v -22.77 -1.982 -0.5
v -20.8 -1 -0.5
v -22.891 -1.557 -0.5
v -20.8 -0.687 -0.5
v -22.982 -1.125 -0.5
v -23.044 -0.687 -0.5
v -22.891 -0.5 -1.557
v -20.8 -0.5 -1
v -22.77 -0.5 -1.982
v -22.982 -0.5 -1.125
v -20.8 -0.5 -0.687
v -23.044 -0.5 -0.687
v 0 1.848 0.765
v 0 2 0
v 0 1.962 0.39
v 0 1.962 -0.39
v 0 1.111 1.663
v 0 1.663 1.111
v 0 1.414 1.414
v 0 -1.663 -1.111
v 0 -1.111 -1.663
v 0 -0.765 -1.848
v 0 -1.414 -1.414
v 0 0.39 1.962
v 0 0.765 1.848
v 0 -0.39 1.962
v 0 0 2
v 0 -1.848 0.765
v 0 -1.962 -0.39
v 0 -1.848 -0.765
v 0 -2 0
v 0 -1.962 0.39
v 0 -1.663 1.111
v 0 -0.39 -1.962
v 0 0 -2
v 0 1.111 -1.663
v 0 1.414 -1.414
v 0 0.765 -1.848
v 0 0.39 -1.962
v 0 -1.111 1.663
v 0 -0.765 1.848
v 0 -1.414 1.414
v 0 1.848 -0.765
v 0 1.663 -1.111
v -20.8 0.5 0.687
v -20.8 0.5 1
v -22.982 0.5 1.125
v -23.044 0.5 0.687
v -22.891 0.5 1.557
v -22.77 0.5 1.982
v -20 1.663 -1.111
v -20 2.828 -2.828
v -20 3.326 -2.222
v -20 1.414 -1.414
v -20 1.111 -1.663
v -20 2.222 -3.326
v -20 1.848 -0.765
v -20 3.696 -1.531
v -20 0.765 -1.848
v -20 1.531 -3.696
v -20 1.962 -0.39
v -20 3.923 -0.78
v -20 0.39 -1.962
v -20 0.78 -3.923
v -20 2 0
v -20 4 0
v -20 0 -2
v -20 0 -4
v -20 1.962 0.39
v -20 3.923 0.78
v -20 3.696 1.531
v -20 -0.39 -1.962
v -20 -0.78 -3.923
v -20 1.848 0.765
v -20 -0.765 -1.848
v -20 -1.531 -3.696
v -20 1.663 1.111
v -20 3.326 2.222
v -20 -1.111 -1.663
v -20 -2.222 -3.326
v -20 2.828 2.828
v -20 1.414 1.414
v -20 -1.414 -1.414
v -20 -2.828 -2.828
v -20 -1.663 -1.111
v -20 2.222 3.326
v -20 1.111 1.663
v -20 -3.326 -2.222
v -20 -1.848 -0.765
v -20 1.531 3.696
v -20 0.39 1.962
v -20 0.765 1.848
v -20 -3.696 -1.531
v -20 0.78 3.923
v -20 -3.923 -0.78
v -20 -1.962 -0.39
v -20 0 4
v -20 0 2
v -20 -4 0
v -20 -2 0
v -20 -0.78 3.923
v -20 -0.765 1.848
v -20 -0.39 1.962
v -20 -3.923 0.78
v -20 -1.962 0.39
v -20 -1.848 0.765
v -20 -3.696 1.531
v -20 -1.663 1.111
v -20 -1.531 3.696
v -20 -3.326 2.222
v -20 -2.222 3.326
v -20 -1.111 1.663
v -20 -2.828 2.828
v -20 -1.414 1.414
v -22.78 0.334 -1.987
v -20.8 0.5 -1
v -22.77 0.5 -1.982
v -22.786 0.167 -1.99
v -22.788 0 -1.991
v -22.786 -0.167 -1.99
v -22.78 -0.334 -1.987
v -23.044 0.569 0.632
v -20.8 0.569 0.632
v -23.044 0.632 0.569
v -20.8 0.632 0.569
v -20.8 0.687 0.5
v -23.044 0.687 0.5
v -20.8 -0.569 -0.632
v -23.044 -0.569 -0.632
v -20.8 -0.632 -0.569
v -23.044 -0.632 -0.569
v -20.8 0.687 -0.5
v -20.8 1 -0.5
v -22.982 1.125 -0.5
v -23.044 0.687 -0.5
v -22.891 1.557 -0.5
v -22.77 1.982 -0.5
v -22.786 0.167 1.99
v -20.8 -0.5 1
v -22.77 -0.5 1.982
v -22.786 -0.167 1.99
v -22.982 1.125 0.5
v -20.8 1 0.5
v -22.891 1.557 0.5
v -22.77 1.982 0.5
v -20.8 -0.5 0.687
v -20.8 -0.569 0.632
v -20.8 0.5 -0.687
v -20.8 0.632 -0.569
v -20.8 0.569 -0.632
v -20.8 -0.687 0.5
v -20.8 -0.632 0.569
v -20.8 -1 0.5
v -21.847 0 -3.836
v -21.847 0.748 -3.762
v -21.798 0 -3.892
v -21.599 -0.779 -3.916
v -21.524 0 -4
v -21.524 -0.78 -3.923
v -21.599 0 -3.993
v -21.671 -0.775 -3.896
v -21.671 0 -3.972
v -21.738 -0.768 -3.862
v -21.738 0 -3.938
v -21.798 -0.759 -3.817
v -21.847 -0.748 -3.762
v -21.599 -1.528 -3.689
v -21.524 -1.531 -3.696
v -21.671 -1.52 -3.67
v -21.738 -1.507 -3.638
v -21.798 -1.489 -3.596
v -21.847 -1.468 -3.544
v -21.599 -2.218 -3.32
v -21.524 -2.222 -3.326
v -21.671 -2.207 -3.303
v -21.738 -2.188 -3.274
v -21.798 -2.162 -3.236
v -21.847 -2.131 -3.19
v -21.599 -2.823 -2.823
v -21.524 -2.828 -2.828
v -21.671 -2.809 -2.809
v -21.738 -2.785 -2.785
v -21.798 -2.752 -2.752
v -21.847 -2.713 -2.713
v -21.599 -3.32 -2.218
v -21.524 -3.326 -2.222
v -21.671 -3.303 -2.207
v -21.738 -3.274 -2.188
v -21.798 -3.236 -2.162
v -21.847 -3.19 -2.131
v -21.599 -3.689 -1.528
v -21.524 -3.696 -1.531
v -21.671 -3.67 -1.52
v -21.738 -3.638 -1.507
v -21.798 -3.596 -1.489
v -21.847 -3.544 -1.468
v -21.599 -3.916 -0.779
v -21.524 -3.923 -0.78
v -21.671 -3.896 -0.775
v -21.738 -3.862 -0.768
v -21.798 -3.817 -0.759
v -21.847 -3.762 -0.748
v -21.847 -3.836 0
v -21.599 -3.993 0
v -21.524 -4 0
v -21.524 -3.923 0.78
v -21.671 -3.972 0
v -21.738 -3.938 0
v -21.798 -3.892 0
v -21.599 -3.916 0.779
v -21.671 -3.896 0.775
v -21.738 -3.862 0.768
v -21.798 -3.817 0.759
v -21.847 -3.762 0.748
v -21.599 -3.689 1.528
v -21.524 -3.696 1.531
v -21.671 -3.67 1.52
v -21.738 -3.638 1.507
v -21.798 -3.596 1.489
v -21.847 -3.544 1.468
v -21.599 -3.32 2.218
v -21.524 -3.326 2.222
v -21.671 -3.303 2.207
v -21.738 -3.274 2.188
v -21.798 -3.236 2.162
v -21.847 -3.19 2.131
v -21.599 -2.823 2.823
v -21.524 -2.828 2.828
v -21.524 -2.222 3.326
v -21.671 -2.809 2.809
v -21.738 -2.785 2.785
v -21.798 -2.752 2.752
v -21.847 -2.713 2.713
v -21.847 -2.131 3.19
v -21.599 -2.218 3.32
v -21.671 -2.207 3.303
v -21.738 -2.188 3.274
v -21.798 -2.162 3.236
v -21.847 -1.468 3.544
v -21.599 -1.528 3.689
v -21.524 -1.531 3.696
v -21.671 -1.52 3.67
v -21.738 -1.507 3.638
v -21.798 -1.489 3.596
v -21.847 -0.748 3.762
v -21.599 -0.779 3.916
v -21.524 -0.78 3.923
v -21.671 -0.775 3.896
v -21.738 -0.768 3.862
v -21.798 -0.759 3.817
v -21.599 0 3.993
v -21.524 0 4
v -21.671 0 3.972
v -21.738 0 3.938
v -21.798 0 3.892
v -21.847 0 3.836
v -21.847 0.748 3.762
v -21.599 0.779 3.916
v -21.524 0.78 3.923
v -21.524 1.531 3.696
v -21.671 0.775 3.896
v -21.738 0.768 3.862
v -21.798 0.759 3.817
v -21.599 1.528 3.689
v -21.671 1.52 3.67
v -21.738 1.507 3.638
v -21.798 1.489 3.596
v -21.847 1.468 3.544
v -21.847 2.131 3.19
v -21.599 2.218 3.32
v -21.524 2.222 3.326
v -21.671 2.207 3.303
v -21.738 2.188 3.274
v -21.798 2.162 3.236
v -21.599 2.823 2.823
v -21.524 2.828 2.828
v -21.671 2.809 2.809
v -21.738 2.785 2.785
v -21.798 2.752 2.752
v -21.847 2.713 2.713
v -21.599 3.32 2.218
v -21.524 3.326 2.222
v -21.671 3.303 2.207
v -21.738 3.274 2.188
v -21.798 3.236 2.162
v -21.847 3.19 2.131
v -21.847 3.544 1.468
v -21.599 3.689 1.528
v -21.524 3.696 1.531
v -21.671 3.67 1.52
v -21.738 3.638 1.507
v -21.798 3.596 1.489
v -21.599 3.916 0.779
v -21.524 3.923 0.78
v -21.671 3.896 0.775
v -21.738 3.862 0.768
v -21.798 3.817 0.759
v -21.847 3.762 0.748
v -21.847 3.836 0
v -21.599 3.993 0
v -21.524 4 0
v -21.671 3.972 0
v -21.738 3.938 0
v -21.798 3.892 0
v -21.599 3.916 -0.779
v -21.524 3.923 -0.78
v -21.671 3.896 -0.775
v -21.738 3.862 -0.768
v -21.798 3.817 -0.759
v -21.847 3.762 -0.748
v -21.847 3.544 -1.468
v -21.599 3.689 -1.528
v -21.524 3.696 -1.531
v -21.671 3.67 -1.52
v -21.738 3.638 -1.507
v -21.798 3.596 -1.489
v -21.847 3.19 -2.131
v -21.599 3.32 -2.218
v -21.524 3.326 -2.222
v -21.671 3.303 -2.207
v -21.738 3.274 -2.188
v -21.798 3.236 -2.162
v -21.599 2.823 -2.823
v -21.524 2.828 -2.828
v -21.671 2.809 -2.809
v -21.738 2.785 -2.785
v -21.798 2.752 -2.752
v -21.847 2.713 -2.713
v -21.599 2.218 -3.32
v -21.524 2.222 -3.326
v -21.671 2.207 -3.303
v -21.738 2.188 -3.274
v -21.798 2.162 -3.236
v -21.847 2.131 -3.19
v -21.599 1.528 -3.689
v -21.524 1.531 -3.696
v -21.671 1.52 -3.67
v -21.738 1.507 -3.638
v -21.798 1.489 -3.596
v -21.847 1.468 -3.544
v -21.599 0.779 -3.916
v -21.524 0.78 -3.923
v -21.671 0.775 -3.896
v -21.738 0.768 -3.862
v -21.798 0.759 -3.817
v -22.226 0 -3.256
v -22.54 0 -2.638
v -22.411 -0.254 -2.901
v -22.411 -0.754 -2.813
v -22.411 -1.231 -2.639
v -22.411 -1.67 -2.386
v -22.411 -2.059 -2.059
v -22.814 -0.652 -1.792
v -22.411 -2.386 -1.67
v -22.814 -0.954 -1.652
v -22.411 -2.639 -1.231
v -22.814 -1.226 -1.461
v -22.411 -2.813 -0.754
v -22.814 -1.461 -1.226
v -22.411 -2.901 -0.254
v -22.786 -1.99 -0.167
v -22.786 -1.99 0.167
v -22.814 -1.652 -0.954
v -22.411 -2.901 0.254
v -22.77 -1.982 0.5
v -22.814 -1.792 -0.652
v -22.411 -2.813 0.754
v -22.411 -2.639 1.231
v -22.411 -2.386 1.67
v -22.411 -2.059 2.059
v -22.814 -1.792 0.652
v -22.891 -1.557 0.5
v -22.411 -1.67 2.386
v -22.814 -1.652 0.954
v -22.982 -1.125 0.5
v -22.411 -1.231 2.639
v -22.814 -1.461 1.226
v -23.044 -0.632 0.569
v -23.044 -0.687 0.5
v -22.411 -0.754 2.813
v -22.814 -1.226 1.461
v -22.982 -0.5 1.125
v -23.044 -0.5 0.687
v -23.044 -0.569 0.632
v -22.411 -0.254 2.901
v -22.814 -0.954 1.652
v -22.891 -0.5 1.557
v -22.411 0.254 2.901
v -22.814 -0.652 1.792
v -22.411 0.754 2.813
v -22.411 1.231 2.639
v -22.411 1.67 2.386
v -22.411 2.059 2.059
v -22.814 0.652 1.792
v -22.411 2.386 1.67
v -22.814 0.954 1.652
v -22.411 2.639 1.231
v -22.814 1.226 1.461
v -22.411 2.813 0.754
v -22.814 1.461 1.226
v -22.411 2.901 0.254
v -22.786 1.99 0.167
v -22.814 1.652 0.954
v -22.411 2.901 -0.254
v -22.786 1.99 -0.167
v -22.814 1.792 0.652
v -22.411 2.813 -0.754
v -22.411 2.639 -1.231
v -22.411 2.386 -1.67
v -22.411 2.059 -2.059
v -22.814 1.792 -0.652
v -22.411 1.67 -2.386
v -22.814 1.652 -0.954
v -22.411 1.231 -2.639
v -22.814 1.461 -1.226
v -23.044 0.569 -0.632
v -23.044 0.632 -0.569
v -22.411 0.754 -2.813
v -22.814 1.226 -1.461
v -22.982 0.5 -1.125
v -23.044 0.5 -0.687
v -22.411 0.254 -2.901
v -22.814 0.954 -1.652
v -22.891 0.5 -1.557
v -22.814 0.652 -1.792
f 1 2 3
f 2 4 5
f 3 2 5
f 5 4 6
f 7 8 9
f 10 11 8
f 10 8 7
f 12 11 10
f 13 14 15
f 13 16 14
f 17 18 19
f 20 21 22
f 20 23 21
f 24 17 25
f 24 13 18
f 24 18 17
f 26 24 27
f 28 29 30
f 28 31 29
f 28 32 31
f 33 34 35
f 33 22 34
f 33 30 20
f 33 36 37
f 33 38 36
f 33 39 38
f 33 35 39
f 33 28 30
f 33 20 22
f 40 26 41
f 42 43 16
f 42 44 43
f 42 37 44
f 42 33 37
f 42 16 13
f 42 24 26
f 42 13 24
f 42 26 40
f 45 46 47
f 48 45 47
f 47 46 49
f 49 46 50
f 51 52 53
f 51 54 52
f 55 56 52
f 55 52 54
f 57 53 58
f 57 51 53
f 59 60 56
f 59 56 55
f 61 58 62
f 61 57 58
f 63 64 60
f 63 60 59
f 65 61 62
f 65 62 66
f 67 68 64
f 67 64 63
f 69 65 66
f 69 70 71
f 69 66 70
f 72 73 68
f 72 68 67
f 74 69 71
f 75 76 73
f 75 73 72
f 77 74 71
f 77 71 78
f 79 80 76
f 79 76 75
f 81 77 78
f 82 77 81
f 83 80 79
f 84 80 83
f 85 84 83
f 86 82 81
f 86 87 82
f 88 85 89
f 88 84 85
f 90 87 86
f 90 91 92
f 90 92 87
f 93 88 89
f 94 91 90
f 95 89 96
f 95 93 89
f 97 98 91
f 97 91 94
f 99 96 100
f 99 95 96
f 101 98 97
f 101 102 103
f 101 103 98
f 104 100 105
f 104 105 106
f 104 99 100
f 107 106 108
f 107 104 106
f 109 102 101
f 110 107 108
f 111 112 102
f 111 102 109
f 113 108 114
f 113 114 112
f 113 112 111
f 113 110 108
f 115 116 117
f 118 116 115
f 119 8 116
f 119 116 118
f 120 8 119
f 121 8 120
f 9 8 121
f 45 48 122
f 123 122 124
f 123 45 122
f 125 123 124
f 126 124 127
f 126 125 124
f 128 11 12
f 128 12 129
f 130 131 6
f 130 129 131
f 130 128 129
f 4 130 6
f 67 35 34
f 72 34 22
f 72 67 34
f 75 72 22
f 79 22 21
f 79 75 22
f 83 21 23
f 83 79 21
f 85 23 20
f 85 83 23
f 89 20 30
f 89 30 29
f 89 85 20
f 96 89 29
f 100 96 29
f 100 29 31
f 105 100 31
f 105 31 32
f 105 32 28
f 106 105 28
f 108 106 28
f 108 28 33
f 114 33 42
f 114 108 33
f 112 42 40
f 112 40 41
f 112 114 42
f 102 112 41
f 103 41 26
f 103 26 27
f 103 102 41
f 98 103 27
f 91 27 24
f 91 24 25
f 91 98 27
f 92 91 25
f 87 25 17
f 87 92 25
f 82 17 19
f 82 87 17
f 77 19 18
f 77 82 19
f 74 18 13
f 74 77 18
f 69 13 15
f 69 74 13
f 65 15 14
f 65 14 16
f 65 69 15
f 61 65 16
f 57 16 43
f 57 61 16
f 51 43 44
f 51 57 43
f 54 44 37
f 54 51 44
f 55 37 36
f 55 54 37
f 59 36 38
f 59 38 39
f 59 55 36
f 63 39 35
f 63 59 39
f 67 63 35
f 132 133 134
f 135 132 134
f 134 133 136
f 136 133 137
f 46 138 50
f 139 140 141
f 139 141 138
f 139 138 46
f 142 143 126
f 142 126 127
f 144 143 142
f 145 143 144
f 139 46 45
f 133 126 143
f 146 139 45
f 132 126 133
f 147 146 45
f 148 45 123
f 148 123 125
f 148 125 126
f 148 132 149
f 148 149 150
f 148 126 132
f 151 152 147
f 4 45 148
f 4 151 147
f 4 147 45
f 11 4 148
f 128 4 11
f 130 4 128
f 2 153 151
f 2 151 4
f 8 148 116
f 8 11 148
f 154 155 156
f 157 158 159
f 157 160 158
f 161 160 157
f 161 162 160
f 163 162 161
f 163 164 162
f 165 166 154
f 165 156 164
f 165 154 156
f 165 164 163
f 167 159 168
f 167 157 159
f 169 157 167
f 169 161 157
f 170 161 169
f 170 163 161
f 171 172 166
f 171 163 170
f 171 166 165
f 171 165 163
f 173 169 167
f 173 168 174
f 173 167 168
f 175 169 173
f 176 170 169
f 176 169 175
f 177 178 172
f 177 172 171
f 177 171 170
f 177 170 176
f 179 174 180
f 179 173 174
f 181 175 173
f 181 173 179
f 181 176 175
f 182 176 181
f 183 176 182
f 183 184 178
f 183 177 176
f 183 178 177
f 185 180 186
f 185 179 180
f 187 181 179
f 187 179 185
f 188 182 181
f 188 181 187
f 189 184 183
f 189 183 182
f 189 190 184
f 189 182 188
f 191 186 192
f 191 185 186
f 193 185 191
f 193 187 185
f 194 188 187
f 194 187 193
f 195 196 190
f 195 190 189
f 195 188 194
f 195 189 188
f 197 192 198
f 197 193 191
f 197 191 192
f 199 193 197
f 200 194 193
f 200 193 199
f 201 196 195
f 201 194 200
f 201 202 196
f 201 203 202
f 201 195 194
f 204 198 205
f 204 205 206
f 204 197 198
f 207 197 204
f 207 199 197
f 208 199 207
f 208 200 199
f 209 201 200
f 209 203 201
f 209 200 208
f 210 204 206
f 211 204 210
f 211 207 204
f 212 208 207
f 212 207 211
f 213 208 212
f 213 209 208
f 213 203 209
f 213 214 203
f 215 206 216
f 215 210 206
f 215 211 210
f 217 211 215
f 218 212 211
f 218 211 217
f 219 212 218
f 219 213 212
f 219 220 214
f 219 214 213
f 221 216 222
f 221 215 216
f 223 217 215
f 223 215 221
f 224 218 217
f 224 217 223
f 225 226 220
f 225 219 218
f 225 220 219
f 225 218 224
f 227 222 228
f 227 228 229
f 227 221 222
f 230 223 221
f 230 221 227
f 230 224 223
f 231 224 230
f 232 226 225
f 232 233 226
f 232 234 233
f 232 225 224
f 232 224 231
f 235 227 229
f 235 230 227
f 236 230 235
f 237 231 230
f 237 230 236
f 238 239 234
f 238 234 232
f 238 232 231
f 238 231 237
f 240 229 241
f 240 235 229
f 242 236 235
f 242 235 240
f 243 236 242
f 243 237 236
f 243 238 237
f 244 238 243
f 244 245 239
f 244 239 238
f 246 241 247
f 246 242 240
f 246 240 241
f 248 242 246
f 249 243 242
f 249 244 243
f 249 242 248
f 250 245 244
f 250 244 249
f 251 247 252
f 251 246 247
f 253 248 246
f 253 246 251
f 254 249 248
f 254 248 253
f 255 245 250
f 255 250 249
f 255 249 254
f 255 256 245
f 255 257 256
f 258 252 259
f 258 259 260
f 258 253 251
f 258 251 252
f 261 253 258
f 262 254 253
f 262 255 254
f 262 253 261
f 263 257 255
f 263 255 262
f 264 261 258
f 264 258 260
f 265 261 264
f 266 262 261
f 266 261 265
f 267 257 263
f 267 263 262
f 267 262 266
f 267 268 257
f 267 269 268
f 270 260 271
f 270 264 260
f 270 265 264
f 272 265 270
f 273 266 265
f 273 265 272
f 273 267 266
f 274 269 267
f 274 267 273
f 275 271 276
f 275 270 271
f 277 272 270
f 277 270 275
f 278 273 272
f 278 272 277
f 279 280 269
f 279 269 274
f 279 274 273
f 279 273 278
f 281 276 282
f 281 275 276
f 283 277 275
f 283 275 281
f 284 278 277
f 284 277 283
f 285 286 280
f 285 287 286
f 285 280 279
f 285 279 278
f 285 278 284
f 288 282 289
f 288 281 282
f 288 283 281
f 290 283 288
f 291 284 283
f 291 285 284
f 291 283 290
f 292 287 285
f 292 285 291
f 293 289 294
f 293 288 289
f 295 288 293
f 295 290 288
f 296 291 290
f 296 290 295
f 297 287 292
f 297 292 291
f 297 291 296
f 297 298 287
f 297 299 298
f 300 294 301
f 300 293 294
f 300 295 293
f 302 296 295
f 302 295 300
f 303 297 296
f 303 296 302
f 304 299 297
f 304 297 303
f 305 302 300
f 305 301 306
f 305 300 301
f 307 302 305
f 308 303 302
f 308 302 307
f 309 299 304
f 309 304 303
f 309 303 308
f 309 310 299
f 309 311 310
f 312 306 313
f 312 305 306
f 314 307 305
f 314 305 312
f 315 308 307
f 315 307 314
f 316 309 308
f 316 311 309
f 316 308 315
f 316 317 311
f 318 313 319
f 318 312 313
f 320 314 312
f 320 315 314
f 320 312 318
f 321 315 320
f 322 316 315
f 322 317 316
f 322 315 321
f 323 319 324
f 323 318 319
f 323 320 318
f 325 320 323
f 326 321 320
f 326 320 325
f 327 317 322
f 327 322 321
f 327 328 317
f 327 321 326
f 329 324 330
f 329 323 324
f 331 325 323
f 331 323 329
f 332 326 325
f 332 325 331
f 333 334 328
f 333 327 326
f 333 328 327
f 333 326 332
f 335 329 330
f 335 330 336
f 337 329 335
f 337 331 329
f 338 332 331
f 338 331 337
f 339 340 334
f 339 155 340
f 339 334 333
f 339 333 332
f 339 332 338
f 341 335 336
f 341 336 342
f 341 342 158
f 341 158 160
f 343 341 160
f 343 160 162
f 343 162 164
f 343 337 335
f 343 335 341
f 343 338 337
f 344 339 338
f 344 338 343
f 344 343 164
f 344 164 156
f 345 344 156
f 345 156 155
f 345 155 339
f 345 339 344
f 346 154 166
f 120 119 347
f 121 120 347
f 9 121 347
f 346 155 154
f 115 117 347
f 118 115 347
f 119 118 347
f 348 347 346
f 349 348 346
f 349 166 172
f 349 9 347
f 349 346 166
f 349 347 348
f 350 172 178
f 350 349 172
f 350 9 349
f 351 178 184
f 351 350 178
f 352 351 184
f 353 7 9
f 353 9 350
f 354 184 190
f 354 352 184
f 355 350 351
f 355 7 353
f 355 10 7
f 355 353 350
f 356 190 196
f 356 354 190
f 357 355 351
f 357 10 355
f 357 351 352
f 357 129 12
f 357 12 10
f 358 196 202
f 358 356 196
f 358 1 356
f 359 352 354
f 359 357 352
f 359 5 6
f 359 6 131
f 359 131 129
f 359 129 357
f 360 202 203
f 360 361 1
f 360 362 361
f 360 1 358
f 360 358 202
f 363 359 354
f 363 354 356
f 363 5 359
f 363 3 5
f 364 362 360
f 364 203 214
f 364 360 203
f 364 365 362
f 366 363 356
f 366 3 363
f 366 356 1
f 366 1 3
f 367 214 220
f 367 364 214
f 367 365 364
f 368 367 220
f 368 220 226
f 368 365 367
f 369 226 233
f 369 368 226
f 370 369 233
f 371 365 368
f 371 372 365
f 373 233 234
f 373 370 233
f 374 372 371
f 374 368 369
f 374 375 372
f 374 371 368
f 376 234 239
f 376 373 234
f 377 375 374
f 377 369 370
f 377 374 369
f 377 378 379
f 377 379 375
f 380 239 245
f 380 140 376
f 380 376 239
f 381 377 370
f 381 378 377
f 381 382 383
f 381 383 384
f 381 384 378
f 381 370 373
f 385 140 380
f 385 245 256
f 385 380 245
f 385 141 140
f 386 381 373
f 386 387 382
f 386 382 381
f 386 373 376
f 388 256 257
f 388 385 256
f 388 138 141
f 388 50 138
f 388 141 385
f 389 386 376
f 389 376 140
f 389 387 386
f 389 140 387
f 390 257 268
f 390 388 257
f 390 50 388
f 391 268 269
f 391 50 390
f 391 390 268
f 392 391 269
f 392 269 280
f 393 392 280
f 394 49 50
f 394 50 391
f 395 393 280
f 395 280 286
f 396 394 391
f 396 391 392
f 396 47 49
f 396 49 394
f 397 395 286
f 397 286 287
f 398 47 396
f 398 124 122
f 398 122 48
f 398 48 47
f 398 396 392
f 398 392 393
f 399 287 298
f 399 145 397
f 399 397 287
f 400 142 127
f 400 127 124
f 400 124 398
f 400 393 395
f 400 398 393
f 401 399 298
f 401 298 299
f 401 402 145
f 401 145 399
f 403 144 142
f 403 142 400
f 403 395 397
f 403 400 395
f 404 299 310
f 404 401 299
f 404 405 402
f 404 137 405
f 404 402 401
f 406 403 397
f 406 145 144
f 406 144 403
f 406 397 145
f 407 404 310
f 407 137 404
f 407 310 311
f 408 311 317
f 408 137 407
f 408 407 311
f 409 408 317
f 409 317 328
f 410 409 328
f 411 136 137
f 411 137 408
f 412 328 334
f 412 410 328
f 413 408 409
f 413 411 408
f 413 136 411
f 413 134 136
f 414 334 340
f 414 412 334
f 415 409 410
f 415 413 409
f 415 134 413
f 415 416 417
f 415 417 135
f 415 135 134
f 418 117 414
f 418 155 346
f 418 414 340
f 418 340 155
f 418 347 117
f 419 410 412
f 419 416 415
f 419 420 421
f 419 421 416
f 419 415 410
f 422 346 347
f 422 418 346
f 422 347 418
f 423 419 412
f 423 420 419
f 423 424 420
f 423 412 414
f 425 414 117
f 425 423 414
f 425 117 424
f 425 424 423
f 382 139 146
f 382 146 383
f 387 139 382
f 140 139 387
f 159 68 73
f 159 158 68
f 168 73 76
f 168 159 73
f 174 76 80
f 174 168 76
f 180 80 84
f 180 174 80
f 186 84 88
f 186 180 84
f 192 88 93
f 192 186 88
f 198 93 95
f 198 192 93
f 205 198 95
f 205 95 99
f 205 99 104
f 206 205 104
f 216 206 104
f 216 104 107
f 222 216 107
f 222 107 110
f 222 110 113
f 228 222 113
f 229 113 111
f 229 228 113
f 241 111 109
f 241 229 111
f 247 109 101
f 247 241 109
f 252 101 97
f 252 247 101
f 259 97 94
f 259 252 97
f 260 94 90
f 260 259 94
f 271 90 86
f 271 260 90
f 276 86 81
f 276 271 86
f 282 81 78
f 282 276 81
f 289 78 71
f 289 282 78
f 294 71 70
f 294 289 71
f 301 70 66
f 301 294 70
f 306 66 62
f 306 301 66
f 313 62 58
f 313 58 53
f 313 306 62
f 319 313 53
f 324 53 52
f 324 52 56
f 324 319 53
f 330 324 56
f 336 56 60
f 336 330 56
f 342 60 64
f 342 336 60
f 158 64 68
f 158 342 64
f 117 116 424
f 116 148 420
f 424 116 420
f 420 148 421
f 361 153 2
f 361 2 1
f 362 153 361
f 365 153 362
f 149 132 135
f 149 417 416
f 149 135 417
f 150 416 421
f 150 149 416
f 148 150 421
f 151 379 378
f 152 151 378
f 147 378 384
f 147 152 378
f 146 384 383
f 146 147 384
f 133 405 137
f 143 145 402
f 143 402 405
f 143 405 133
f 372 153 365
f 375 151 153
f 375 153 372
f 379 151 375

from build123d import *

# Parameters (mm, degrees)
CUT_EXTRUDE_2_DEPTH      = 0.5
PATTERN_CIRCULAR_1_COUNT = 2
PATTERN_CIRCULAR_1_ANGLE = 90
CUT_EXTRUDE_3_REACH      = 23.556
CUT_EXTRUDE_3_END_RADIUS = 6.5
SKETCH_4_R               = 0.85


with BuildPart() as part:
    # 草图1 → 旋转1 (revolve)
    with BuildSketch(Plane.XY, mode=Mode.PRIVATE) as revolve_1_sk:
        with BuildLine():
            Line((0, 0), (0, 2))
            Line((0, 2), (-20, 2))
            Line((-20, 2), (-20, 4))
            Line((-20, 4), (-21.524428901, 4))
            ThreePointArc((-21.524428901, 4), (-21.705500393, 3.956669476), (-21.847342271, 3.836065574))
            ThreePointArc((-21.847342271, 3.836065574), (-22.778904626, 2.017706029), (-23.1, 0))
            Line((-23.1, 0), (0, 0))
        make_face()
    revolve(revolve_1_sk.sketch.rotate(Axis((0, 0, 0), (-1, 0, 0)), 90), axis=Axis((0, 0, 0), (-1, 0, 0)))

    # 草图3 → 切除-拉伸2 (cut, symmetric)
    with BuildSketch(Plane.XY):
        Polygon((-20.8, -1), (-23.8, -2.495744824), (-23.8, 2.495744824), (-20.8, 1), align=None)
    cut_extrude_2 = extrude(amount=CUT_EXTRUDE_2_DEPTH, both=True, mode=Mode.SUBTRACT)

    # 阵列(圆周)1: 切除-拉伸2 ×2 about axis
    pattern_circular_1_axis = Axis((0, 0, 0), (1, 0, 0))
    for i in range(1, PATTERN_CIRCULAR_1_COUNT):
        add(cut_extrude_2.rotate(pattern_circular_1_axis, i * PATTERN_CIRCULAR_1_ANGLE / (PATTERN_CIRCULAR_1_COUNT - 1)), mode=Mode.SUBTRACT)

    # 切除-拉伸3: up to this sphere (the profile starts inside it)
    cut_extrude_3_end = Location((-16.6, 0, 0)) * Sphere(CUT_EXTRUDE_3_END_RADIUS, mode=Mode.PRIVATE)
    # 草图4 → 切除-拉伸3 (cut, up to the surface)
    with BuildSketch(Plane.ZY.offset(20.8), mode=Mode.PRIVATE) as cut_extrude_3_sk1:
        Circle(SKETCH_4_R)
    cut_extrude_3_tool1 = extrude(cut_extrude_3_sk1.sketch, amount=CUT_EXTRUDE_3_REACH, mode=Mode.PRIVATE) & cut_extrude_3_end
    add(cut_extrude_3_tool1.solids().sort_by_distance((-20.8, 0, 0))[0], mode=Mode.SUBTRACT)


solid = part.part
